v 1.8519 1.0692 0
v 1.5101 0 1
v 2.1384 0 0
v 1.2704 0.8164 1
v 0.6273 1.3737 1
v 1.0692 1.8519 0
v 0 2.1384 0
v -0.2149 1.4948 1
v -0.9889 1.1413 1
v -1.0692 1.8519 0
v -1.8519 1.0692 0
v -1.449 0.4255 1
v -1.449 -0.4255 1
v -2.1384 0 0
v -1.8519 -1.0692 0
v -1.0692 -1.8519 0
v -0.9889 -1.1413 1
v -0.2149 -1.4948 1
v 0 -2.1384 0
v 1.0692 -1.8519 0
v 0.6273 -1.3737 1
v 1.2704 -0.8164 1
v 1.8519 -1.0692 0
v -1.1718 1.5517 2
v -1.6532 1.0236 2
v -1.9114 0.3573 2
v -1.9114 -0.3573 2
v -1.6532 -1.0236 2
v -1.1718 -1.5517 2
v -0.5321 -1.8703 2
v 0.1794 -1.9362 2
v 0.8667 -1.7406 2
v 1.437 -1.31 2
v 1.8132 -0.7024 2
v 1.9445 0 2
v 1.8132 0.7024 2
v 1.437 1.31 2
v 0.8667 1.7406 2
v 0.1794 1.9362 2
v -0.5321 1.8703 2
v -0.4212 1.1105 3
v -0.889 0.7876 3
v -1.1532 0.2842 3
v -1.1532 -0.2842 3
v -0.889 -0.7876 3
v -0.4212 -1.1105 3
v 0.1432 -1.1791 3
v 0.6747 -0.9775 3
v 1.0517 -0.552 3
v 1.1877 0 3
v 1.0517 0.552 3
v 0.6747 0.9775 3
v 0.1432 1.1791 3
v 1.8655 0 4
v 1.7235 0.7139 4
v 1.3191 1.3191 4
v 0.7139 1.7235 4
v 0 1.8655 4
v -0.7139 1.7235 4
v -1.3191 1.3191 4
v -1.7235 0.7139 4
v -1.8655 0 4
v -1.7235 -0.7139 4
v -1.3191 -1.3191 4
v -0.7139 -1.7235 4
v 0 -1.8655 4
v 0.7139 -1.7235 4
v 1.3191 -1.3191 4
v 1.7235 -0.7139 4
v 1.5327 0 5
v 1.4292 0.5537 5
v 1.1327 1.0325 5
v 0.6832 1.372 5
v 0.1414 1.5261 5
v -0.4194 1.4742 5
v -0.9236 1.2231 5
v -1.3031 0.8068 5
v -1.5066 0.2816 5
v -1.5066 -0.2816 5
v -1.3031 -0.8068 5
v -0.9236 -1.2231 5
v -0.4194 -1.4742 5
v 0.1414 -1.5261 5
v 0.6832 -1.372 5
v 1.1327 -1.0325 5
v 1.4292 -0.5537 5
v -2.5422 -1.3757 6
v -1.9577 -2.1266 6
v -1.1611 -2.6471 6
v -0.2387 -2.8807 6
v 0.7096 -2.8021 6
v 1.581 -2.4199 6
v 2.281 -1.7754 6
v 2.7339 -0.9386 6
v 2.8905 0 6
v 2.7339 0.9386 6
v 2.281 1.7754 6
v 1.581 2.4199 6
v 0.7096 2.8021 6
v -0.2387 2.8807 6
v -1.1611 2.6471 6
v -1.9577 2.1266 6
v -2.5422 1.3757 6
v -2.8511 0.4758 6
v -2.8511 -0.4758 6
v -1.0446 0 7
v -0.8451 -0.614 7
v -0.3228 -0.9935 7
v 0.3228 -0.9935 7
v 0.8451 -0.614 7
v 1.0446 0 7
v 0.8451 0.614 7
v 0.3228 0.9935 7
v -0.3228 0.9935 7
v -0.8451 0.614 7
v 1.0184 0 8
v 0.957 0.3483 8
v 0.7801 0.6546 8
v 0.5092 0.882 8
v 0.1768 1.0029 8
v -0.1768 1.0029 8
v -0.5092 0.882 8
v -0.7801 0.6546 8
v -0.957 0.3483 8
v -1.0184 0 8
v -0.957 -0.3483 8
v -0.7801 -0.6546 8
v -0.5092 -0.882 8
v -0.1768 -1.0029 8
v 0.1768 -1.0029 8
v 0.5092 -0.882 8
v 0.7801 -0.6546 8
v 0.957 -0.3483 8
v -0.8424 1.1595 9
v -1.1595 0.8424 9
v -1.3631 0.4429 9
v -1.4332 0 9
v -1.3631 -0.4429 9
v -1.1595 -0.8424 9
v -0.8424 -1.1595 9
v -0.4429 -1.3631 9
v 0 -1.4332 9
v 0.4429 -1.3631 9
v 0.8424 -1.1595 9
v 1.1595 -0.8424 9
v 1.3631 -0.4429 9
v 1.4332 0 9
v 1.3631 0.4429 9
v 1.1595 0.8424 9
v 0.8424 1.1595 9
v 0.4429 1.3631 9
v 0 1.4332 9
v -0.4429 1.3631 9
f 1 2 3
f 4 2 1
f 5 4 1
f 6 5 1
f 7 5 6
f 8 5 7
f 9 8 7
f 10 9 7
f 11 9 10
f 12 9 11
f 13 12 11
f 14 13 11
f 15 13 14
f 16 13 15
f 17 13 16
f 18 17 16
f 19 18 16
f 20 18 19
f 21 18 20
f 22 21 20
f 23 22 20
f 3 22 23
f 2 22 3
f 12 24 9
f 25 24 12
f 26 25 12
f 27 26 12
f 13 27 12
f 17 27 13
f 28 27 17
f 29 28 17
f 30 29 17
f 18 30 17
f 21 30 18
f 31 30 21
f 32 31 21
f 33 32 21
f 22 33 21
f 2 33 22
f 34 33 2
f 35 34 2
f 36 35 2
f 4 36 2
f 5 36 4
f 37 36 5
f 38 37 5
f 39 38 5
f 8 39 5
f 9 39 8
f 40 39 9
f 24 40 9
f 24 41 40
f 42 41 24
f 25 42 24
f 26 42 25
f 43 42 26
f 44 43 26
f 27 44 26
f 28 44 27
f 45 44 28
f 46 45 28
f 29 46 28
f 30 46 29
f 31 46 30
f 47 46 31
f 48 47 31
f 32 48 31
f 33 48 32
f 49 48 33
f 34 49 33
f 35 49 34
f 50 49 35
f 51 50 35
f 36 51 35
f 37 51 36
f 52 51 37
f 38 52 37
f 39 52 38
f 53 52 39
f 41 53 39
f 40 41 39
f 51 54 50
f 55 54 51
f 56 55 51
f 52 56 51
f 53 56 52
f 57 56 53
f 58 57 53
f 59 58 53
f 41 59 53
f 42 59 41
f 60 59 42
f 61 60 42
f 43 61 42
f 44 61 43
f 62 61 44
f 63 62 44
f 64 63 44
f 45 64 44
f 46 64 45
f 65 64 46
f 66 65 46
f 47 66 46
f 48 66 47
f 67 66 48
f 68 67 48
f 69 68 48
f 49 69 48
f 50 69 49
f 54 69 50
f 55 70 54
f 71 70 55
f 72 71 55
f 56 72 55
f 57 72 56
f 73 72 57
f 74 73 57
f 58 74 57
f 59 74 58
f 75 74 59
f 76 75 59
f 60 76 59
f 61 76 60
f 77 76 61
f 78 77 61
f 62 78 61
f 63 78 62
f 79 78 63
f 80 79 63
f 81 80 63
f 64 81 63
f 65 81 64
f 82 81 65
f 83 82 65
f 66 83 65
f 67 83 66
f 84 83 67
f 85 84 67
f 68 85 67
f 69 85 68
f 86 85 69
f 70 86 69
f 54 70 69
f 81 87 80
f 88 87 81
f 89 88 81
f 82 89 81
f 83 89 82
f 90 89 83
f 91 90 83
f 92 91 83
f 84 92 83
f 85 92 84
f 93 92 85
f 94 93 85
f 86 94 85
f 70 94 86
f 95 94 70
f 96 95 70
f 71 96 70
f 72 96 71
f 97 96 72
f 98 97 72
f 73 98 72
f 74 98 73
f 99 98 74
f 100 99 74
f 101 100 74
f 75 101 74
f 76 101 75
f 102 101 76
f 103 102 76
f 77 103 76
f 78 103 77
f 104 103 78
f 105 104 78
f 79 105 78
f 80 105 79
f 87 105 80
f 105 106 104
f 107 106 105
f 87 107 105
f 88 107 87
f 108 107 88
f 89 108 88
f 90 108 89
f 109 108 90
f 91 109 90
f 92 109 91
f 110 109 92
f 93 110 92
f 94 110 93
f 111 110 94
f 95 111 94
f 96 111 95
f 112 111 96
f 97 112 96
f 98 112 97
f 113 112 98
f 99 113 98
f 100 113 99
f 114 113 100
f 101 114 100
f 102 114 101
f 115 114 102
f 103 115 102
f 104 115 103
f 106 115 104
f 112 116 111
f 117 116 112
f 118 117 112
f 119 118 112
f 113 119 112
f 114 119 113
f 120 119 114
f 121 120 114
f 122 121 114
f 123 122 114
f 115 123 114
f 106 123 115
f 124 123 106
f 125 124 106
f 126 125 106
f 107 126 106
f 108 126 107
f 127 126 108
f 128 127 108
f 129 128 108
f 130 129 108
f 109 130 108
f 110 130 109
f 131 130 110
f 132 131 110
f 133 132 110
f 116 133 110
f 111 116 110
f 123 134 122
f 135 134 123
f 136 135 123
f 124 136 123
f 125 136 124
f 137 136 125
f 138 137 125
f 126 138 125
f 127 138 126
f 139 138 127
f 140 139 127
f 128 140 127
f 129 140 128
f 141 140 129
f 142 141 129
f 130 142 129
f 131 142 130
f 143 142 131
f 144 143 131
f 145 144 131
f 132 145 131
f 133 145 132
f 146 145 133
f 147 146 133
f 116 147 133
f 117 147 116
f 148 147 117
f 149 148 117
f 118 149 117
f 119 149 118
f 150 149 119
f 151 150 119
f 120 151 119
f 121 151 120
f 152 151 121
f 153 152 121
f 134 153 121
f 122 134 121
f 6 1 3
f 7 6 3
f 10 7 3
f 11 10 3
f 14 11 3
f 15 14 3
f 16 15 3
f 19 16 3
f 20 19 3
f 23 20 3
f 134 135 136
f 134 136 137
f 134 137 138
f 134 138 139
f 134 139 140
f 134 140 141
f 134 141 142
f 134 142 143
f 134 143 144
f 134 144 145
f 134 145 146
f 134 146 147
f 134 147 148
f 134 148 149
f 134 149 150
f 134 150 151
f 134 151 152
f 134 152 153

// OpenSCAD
union() {
	polyhedron(faces = [[0, 1, 2], [2, 1, 3], [2, 3, 4], [2, 4, 5], [5, 4, 6], [6, 4, 7], [6, 7, 8], [6, 8, 9], [9, 8, 10], [10, 8, 11], [10, 11, 12], [10, 12, 13], [13, 12, 14], [14, 12, 15], [15, 12, 16], [15, 16, 17], [15, 17, 18], [18, 17, 19], [19, 17, 20], [19, 20, 21], [19, 21, 22], [22, 21, 0], [0, 21, 1], [8, 23, 11], [11, 23, 24], [11, 24, 25], [11, 25, 26], [11, 26, 12], [12, 26, 16], [16, 26, 27], [16, 27, 28], [16, 28, 29], [16, 29, 17], [17, 29, 20], [20, 29, 30], [20, 30, 31], [20, 31, 32], [20, 32, 21], [21, 32, 1], [1, 32, 33], [1, 33, 34], [1, 34, 35], [1, 35, 3], [3, 35, 4], [4, 35, 36], [4, 36, 37], [4, 37, 38], [4, 38, 7], [7, 38, 8], [8, 38, 39], [8, 39, 23], [39, 40, 23], [23, 40, 41], [23, 41, 24], [24, 41, 25], [25, 41, 42], [25, 42, 43], [25, 43, 26], [26, 43, 27], [27, 43, 44], [27, 44, 45], [27, 45, 28], [28, 45, 29], [29, 45, 30], [30, 45, 46], [30, 46, 47], [30, 47, 31], [31, 47, 32], [32, 47, 48], [32, 48, 33], [33, 48, 34], [34, 48, 49], [34, 49, 50], [34, 50, 35], [35, 50, 36], [36, 50, 51], [36, 51, 37], [37, 51, 38], [38, 51, 52], [38, 52, 40], [38, 40, 39], [49, 53, 50], [50, 53, 54], [50, 54, 55], [50, 55, 51], [51, 55, 52], [52, 55, 56], [52, 56, 57], [52, 57, 58], [52, 58, 40], [40, 58, 41], [41, 58, 59], [41, 59, 60], [41, 60, 42], [42, 60, 43], [43, 60, 61], [43, 61, 62], [43, 62, 63], [43, 63, 44], [44, 63, 45], [45, 63, 64], [45, 64, 65], [45, 65, 46], [46, 65, 47], [47, 65, 66], [47, 66, 67], [47, 67, 68], [47, 68, 48], [48, 68, 49], [49, 68, 53], [53, 69, 54], [54, 69, 70], [54, 70, 71], [54, 71, 55], [55, 71, 56], [56, 71, 72], [56, 72, 73], [56, 73, 57], [57, 73, 58], [58, 73, 74], [58, 74, 75], [58, 75, 59], [59, 75, 60], [60, 75, 76], [60, 76, 77], [60, 77, 61], [61, 77, 62], [62, 77, 78], [62, 78, 79], [62, 79, 80], [62, 80, 63], [63, 80, 64], [64, 80, 81], [64, 81, 82], [64, 82, 65], [65, 82, 66], [66, 82, 83], [66, 83, 84], [66, 84, 67], [67, 84, 68], [68, 84, 85], [68, 85, 69], [68, 69, 53], [79, 86, 80], [80, 86, 87], [80, 87, 88], [80, 88, 81], [81, 88, 82], [82, 88, 89], [82, 89, 90], [82, 90, 91], [82, 91, 83], [83, 91, 84], [84, 91, 92], [84, 92, 93], [84, 93, 85], [85, 93, 69], [69, 93, 94], [69, 94, 95], [69, 95, 70], [70, 95, 71], [71, 95, 96], [71, 96, 97], [71, 97, 72], [72, 97, 73], [73, 97, 98], [73, 98, 99], [73, 99, 100], [73, 100, 74], [74, 100, 75], [75, 100, 101], [75, 101, 102], [75, 102, 76], [76, 102, 77], [77, 102, 103], [77, 103, 104], [77, 104, 78], [78, 104, 79], [79, 104, 86], [103, 105, 104], [104, 105, 106], [104, 106, 86], [86, 106, 87], [87, 106, 107], [87, 107, 88], [88, 107, 89], [89, 107, 108], [89, 108, 90], [90, 108, 91], [91, 108, 109], [91, 109, 92], [92, 109, 93], [93, 109, 110], [93, 110, 94], [94, 110, 95], [95, 110, 111], [95, 111, 96], [96, 111, 97], [97, 111, 112], [97, 112, 98], [98, 112, 99], [99, 112, 113], [99, 113, 100], [100, 113, 101], [101, 113, 114], [101, 114, 102], [102, 114, 103], [103, 114, 105], [110, 115, 111], [111, 115, 116], [111, 116, 117], [111, 117, 118], [111, 118, 112], [112, 118, 113], [113, 118, 119], [113, 119, 120], [113, 120, 121], [113, 121, 122], [113, 122, 114], [114, 122, 105], [105, 122, 123], [105, 123, 124], [105, 124, 125], [105, 125, 106], [106, 125, 107], [107, 125, 126], [107, 126, 127], [107, 127, 128], [107, 128, 129], [107, 129, 108], [108, 129, 109], [109, 129, 130], [109, 130, 131], [109, 131, 132], [109, 132, 115], [109, 115, 110], [121, 133, 122], [122, 133, 134], [122, 134, 135], [122, 135, 123], [123, 135, 124], [124, 135, 136], [124, 136, 137], [124, 137, 125], [125, 137, 126], [126, 137, 138], [126, 138, 139], [126, 139, 127], [127, 139, 128], [128, 139, 140], [128, 140, 141], [128, 141, 129], [129, 141, 130], [130, 141, 142], [130, 142, 143], [130, 143, 144], [130, 144, 131], [131, 144, 132], [132, 144, 145], [132, 145, 146], [132, 146, 115], [115, 146, 116], [116, 146, 147], [116, 147, 148], [116, 148, 117], [117, 148, 118], [118, 148, 149], [118, 149, 150], [118, 150, 119], [119, 150, 120], [120, 150, 151], [120, 151, 152], [120, 152, 133], [120, 133, 121], [0, 2, 5], [0, 5, 6], [0, 6, 9], [0, 9, 10], [0, 10, 13], [0, 13, 14], [0, 14, 15], [0, 15, 18], [0, 18, 19], [0, 19, 22], [135, 134, 133], [136, 135, 133], [137, 136, 133], [138, 137, 133], [139, 138, 133], [140, 139, 133], [141, 140, 133], [142, 141, 133], [143, 142, 133], [144, 143, 133], [145, 144, 133], [146, 145, 133], [147, 146, 133], [148, 147, 133], [149, 148, 133], [150, 149, 133], [151, 150, 133], [152, 151, 133]], points = [[2.1384077496, 0.0000000000, 0.0000000000], [1.5101380515, 0.0000000000, 1.0000000000], [1.8519154348, 1.0692038748, 0.0000000000], [1.2704089709, 0.8164422706, 1.0000000000], [0.6273340183, 1.3736698890, 1.0000000000], [1.0692038748, 1.8519154348, 0.0000000000], [0.0000000000, 2.1384077496, 0.0000000000], [-0.2149150526, 1.4947670236, 1.0000000000], [-0.9889301128, 1.1412861896, 1.0000000000], [-1.0692038748, 1.8519154348, 0.0000000000], [-1.8519154348, 1.0692038748, 0.0000000000], [-1.4489668496, 0.4254550544, 1.0000000000], [-1.4489668496, -0.4254550544, 1.0000000000], [-2.1384077496, 0.0000000000, 0.0000000000], [-1.8519154348, -1.0692038748, 0.0000000000], [-1.0692038748, -1.8519154348, 0.0000000000], [-0.9889301128, -1.1412861896, 1.0000000000], [-0.2149150526, -1.4947670236, 1.0000000000], [-0.0000000000, -2.1384077496, 0.0000000000], [1.0692038748, -1.8519154348, 0.0000000000], [0.6273340183, -1.3736698890, 1.0000000000], [1.2704089709, -0.8164422706, 1.0000000000], [1.8519154348, -1.0692038748, 0.0000000000], [-1.1718173177, 1.5517369070, 2.0000000000], [-1.6532391324, 1.0236423328, 2.0000000000], [-1.9113818415, 0.3572991894, 2.0000000000], [-1.9113818415, -0.3572991894, 2.0000000000], [-1.6532391324, -1.0236423328, 2.0000000000], [-1.1718173177, -1.5517369070, 2.0000000000], [-0.5321350809, -1.8702608134, 2.0000000000], [0.1794149472, -1.9361956335, 2.0000000000], [0.8667339926, -1.7406365045, 2.0000000000], [1.4369958095, -1.3099947703, 2.0000000000], [1.8131833796, -0.7024309835, 2.0000000000], [1.9444904872, 0.0000000000, 2.0000000000], [1.8131833796, 0.7024309835, 2.0000000000], [1.4369958095, 1.3099947703, 2.0000000000], [0.8667339926, 1.7406365045, 2.0000000000], [0.1794149472, 1.9361956335, 2.0000000000], [-0.5321350809, 1.8702608134, 2.0000000000], [-0.4211710234, 1.1105367190, 3.0000000000], [-0.8890205672, 0.7876034956, 3.0000000000], [-1.1532062130, 0.2842398030, 3.0000000000], [-1.1532062130, -0.2842398030, 3.0000000000], [-0.8890205672, -0.7876034956, 3.0000000000], [-0.4211710234, -1.1105367190, 3.0000000000], [0.1431637263, -1.1790593635, 3.0000000000], [0.6747013915, -0.9774737170, 3.0000000000], [1.0516730990, -0.5519606218, 3.0000000000], [1.1877191735, 0.0000000000, 3.0000000000], [1.0516730990, 0.5519606218, 3.0000000000], [0.6747013915, 0.9774737170, 3.0000000000], [0.1431637263, 1.1790593635, 3.0000000000], [1.8655341358, 0.0000000000, 4.0000000000], [1.7235288053, 0.7139090063, 4.0000000000], [1.3191318380, 1.3191318380, 4.0000000000], [0.7139090063, 1.7235288053, 4.0000000000], [0.0000000000, 1.8655341358, 4.0000000000], [-0.7139090063, 1.7235288053, 4.0000000000], [-1.3191318380, 1.3191318380, 4.0000000000], [-1.7235288053, 0.7139090063, 4.0000000000], [-1.8655341358, 0.0000000000, 4.0000000000], [-1.7235288053, -0.7139090063, 4.0000000000], [-1.3191318380, -1.3191318380, 4.0000000000], [-0.7139090063, -1.7235288053, 4.0000000000], [-0.0000000000, -1.8655341358, 4.0000000000], [0.7139090063, -1.7235288053, 4.0000000000], [1.3191318380, -1.3191318380, 4.0000000000], [1.7235288053, -0.7139090063, 4.0000000000], [1.5326611209, 0.0000000000, 5.0000000000], [1.4291639323, 0.5536610570, 5.0000000000], [1.1326502354, 1.0325471203, 5.0000000000], [0.6831658480, 1.3719819735, 5.0000000000], [0.1414161272, 1.5261230588, 5.0000000000], [-0.4194326251, 1.4741527684, 5.0000000000], [-0.9236346773, 1.2230899781, 5.0000000000], [-1.3030947483, 0.8068421088, 5.0000000000], [-1.5065646528, 0.2816257419, 5.0000000000], [-1.5065646528, -0.2816257419, 5.0000000000], [-1.3030947483, -0.8068421088, 5.0000000000], [-0.9236346773, -1.2230899781, 5.0000000000], [-0.4194326251, -1.4741527684, 5.0000000000], [0.1414161272, -1.5261230588, 5.0000000000], [0.6831658480, -1.3719819735, 5.0000000000], [1.1326502354, -1.0325471203, 5.0000000000], [1.4291639323, -0.5536610570, 5.0000000000], [-2.5421552803, -1.3757456396, 6.0000000000], [-1.9577104162, -2.1266404162, 6.0000000000], [-1.1611172516, -2.6470807056, 6.0000000000], [-0.2386990161, -2.8806687268, 6.0000000000], [0.7095859615, -2.8020915932, 6.0000000000], [1.5809762898, -2.4198643567, 6.0000000000], [2.2810433058, -1.7754072690, 6.0000000000], [2.7339238856, -0.9385572554, 6.0000000000], [2.8905413911, 0.0000000000, 6.0000000000], [2.7339238856, 0.9385572554, 6.0000000000], [2.2810433058, 1.7754072690, 6.0000000000], [1.5809762898, 2.4198643567, 6.0000000000], [0.7095859615, 2.8020915932, 6.0000000000], [-0.2386990161, 2.8806687268, 6.0000000000], [-1.1611172516, 2.6470807056, 6.0000000000], [-1.9577104162, 2.1266404162, 6.0000000000], [-2.5421552803, 1.3757456396, 6.0000000000], [-2.8511181741, 0.4757674760, 6.0000000000], [-2.8511181741, -0.4757674760, 6.0000000000], [-1.0446442220, 0.0000000000, 7.0000000000], [-0.8451349287, -0.6140264676, 7.0000000000], [-0.3228128177, -0.9935156946, 7.0000000000], [0.3228128177, -0.9935156946, 7.0000000000], [0.8451349287, -0.6140264676, 7.0000000000], [1.0446442220, 0.0000000000, 7.0000000000], [0.8451349287, 0.6140264676, 7.0000000000], [0.3228128177, 0.9935156946, 7.0000000000], [-0.3228128177, 0.9935156946, 7.0000000000], [-0.8451349287, 0.6140264676, 7.0000000000], [1.0184098771, 0.0000000000, 8.0000000000], [0.9569922465, 0.3483166921, 8.0000000000], [0.7801472272, 0.6546212506, 8.0000000000], [0.5092049386, 0.8819688250, 8.0000000000], [0.1768450193, 1.0029379427, 8.0000000000], [-0.1768450193, 1.0029379427, 8.0000000000], [-0.5092049386, 0.8819688250, 8.0000000000], [-0.7801472272, 0.6546212506, 8.0000000000], [-0.9569922465, 0.3483166921, 8.0000000000], [-1.0184098771, 0.0000000000, 8.0000000000], [-0.9569922465, -0.3483166921, 8.0000000000], [-0.7801472272, -0.6546212506, 8.0000000000], [-0.5092049386, -0.8819688250, 8.0000000000], [-0.1768450193, -1.0029379427, 8.0000000000], [0.1768450193, -1.0029379427, 8.0000000000], [0.5092049386, -0.8819688250, 8.0000000000], [0.7801472272, -0.6546212506, 8.0000000000], [0.9569922465, -0.3483166921, 8.0000000000], [-0.8424131149, 1.1594821809, 9.0000000000], [-1.1594821809, 0.8424131149, 9.0000000000], [-1.3630530524, 0.4428827837, 9.0000000000], [-1.4331987943, 0.0000000000, 9.0000000000], [-1.3630530524, -0.4428827837, 9.0000000000], [-1.1594821809, -0.8424131149, 9.0000000000], [-0.8424131149, -1.1594821809, 9.0000000000], [-0.4428827837, -1.3630530524, 9.0000000000], [-0.0000000000, -1.4331987943, 9.0000000000], [0.4428827837, -1.3630530524, 9.0000000000], [0.8424131149, -1.1594821809, 9.0000000000], [1.1594821809, -0.8424131149, 9.0000000000], [1.3630530524, -0.4428827837, 9.0000000000], [1.4331987943, 0.0000000000, 9.0000000000], [1.3630530524, 0.4428827837, 9.0000000000], [1.1594821809, 0.8424131149, 9.0000000000], [0.8424131149, 1.1594821809, 9.0000000000], [0.4428827837, 1.3630530524, 9.0000000000], [0.0000000000, 1.4331987943, 9.0000000000], [-0.4428827837, 1.3630530524, 9.0000000000]]);
}
